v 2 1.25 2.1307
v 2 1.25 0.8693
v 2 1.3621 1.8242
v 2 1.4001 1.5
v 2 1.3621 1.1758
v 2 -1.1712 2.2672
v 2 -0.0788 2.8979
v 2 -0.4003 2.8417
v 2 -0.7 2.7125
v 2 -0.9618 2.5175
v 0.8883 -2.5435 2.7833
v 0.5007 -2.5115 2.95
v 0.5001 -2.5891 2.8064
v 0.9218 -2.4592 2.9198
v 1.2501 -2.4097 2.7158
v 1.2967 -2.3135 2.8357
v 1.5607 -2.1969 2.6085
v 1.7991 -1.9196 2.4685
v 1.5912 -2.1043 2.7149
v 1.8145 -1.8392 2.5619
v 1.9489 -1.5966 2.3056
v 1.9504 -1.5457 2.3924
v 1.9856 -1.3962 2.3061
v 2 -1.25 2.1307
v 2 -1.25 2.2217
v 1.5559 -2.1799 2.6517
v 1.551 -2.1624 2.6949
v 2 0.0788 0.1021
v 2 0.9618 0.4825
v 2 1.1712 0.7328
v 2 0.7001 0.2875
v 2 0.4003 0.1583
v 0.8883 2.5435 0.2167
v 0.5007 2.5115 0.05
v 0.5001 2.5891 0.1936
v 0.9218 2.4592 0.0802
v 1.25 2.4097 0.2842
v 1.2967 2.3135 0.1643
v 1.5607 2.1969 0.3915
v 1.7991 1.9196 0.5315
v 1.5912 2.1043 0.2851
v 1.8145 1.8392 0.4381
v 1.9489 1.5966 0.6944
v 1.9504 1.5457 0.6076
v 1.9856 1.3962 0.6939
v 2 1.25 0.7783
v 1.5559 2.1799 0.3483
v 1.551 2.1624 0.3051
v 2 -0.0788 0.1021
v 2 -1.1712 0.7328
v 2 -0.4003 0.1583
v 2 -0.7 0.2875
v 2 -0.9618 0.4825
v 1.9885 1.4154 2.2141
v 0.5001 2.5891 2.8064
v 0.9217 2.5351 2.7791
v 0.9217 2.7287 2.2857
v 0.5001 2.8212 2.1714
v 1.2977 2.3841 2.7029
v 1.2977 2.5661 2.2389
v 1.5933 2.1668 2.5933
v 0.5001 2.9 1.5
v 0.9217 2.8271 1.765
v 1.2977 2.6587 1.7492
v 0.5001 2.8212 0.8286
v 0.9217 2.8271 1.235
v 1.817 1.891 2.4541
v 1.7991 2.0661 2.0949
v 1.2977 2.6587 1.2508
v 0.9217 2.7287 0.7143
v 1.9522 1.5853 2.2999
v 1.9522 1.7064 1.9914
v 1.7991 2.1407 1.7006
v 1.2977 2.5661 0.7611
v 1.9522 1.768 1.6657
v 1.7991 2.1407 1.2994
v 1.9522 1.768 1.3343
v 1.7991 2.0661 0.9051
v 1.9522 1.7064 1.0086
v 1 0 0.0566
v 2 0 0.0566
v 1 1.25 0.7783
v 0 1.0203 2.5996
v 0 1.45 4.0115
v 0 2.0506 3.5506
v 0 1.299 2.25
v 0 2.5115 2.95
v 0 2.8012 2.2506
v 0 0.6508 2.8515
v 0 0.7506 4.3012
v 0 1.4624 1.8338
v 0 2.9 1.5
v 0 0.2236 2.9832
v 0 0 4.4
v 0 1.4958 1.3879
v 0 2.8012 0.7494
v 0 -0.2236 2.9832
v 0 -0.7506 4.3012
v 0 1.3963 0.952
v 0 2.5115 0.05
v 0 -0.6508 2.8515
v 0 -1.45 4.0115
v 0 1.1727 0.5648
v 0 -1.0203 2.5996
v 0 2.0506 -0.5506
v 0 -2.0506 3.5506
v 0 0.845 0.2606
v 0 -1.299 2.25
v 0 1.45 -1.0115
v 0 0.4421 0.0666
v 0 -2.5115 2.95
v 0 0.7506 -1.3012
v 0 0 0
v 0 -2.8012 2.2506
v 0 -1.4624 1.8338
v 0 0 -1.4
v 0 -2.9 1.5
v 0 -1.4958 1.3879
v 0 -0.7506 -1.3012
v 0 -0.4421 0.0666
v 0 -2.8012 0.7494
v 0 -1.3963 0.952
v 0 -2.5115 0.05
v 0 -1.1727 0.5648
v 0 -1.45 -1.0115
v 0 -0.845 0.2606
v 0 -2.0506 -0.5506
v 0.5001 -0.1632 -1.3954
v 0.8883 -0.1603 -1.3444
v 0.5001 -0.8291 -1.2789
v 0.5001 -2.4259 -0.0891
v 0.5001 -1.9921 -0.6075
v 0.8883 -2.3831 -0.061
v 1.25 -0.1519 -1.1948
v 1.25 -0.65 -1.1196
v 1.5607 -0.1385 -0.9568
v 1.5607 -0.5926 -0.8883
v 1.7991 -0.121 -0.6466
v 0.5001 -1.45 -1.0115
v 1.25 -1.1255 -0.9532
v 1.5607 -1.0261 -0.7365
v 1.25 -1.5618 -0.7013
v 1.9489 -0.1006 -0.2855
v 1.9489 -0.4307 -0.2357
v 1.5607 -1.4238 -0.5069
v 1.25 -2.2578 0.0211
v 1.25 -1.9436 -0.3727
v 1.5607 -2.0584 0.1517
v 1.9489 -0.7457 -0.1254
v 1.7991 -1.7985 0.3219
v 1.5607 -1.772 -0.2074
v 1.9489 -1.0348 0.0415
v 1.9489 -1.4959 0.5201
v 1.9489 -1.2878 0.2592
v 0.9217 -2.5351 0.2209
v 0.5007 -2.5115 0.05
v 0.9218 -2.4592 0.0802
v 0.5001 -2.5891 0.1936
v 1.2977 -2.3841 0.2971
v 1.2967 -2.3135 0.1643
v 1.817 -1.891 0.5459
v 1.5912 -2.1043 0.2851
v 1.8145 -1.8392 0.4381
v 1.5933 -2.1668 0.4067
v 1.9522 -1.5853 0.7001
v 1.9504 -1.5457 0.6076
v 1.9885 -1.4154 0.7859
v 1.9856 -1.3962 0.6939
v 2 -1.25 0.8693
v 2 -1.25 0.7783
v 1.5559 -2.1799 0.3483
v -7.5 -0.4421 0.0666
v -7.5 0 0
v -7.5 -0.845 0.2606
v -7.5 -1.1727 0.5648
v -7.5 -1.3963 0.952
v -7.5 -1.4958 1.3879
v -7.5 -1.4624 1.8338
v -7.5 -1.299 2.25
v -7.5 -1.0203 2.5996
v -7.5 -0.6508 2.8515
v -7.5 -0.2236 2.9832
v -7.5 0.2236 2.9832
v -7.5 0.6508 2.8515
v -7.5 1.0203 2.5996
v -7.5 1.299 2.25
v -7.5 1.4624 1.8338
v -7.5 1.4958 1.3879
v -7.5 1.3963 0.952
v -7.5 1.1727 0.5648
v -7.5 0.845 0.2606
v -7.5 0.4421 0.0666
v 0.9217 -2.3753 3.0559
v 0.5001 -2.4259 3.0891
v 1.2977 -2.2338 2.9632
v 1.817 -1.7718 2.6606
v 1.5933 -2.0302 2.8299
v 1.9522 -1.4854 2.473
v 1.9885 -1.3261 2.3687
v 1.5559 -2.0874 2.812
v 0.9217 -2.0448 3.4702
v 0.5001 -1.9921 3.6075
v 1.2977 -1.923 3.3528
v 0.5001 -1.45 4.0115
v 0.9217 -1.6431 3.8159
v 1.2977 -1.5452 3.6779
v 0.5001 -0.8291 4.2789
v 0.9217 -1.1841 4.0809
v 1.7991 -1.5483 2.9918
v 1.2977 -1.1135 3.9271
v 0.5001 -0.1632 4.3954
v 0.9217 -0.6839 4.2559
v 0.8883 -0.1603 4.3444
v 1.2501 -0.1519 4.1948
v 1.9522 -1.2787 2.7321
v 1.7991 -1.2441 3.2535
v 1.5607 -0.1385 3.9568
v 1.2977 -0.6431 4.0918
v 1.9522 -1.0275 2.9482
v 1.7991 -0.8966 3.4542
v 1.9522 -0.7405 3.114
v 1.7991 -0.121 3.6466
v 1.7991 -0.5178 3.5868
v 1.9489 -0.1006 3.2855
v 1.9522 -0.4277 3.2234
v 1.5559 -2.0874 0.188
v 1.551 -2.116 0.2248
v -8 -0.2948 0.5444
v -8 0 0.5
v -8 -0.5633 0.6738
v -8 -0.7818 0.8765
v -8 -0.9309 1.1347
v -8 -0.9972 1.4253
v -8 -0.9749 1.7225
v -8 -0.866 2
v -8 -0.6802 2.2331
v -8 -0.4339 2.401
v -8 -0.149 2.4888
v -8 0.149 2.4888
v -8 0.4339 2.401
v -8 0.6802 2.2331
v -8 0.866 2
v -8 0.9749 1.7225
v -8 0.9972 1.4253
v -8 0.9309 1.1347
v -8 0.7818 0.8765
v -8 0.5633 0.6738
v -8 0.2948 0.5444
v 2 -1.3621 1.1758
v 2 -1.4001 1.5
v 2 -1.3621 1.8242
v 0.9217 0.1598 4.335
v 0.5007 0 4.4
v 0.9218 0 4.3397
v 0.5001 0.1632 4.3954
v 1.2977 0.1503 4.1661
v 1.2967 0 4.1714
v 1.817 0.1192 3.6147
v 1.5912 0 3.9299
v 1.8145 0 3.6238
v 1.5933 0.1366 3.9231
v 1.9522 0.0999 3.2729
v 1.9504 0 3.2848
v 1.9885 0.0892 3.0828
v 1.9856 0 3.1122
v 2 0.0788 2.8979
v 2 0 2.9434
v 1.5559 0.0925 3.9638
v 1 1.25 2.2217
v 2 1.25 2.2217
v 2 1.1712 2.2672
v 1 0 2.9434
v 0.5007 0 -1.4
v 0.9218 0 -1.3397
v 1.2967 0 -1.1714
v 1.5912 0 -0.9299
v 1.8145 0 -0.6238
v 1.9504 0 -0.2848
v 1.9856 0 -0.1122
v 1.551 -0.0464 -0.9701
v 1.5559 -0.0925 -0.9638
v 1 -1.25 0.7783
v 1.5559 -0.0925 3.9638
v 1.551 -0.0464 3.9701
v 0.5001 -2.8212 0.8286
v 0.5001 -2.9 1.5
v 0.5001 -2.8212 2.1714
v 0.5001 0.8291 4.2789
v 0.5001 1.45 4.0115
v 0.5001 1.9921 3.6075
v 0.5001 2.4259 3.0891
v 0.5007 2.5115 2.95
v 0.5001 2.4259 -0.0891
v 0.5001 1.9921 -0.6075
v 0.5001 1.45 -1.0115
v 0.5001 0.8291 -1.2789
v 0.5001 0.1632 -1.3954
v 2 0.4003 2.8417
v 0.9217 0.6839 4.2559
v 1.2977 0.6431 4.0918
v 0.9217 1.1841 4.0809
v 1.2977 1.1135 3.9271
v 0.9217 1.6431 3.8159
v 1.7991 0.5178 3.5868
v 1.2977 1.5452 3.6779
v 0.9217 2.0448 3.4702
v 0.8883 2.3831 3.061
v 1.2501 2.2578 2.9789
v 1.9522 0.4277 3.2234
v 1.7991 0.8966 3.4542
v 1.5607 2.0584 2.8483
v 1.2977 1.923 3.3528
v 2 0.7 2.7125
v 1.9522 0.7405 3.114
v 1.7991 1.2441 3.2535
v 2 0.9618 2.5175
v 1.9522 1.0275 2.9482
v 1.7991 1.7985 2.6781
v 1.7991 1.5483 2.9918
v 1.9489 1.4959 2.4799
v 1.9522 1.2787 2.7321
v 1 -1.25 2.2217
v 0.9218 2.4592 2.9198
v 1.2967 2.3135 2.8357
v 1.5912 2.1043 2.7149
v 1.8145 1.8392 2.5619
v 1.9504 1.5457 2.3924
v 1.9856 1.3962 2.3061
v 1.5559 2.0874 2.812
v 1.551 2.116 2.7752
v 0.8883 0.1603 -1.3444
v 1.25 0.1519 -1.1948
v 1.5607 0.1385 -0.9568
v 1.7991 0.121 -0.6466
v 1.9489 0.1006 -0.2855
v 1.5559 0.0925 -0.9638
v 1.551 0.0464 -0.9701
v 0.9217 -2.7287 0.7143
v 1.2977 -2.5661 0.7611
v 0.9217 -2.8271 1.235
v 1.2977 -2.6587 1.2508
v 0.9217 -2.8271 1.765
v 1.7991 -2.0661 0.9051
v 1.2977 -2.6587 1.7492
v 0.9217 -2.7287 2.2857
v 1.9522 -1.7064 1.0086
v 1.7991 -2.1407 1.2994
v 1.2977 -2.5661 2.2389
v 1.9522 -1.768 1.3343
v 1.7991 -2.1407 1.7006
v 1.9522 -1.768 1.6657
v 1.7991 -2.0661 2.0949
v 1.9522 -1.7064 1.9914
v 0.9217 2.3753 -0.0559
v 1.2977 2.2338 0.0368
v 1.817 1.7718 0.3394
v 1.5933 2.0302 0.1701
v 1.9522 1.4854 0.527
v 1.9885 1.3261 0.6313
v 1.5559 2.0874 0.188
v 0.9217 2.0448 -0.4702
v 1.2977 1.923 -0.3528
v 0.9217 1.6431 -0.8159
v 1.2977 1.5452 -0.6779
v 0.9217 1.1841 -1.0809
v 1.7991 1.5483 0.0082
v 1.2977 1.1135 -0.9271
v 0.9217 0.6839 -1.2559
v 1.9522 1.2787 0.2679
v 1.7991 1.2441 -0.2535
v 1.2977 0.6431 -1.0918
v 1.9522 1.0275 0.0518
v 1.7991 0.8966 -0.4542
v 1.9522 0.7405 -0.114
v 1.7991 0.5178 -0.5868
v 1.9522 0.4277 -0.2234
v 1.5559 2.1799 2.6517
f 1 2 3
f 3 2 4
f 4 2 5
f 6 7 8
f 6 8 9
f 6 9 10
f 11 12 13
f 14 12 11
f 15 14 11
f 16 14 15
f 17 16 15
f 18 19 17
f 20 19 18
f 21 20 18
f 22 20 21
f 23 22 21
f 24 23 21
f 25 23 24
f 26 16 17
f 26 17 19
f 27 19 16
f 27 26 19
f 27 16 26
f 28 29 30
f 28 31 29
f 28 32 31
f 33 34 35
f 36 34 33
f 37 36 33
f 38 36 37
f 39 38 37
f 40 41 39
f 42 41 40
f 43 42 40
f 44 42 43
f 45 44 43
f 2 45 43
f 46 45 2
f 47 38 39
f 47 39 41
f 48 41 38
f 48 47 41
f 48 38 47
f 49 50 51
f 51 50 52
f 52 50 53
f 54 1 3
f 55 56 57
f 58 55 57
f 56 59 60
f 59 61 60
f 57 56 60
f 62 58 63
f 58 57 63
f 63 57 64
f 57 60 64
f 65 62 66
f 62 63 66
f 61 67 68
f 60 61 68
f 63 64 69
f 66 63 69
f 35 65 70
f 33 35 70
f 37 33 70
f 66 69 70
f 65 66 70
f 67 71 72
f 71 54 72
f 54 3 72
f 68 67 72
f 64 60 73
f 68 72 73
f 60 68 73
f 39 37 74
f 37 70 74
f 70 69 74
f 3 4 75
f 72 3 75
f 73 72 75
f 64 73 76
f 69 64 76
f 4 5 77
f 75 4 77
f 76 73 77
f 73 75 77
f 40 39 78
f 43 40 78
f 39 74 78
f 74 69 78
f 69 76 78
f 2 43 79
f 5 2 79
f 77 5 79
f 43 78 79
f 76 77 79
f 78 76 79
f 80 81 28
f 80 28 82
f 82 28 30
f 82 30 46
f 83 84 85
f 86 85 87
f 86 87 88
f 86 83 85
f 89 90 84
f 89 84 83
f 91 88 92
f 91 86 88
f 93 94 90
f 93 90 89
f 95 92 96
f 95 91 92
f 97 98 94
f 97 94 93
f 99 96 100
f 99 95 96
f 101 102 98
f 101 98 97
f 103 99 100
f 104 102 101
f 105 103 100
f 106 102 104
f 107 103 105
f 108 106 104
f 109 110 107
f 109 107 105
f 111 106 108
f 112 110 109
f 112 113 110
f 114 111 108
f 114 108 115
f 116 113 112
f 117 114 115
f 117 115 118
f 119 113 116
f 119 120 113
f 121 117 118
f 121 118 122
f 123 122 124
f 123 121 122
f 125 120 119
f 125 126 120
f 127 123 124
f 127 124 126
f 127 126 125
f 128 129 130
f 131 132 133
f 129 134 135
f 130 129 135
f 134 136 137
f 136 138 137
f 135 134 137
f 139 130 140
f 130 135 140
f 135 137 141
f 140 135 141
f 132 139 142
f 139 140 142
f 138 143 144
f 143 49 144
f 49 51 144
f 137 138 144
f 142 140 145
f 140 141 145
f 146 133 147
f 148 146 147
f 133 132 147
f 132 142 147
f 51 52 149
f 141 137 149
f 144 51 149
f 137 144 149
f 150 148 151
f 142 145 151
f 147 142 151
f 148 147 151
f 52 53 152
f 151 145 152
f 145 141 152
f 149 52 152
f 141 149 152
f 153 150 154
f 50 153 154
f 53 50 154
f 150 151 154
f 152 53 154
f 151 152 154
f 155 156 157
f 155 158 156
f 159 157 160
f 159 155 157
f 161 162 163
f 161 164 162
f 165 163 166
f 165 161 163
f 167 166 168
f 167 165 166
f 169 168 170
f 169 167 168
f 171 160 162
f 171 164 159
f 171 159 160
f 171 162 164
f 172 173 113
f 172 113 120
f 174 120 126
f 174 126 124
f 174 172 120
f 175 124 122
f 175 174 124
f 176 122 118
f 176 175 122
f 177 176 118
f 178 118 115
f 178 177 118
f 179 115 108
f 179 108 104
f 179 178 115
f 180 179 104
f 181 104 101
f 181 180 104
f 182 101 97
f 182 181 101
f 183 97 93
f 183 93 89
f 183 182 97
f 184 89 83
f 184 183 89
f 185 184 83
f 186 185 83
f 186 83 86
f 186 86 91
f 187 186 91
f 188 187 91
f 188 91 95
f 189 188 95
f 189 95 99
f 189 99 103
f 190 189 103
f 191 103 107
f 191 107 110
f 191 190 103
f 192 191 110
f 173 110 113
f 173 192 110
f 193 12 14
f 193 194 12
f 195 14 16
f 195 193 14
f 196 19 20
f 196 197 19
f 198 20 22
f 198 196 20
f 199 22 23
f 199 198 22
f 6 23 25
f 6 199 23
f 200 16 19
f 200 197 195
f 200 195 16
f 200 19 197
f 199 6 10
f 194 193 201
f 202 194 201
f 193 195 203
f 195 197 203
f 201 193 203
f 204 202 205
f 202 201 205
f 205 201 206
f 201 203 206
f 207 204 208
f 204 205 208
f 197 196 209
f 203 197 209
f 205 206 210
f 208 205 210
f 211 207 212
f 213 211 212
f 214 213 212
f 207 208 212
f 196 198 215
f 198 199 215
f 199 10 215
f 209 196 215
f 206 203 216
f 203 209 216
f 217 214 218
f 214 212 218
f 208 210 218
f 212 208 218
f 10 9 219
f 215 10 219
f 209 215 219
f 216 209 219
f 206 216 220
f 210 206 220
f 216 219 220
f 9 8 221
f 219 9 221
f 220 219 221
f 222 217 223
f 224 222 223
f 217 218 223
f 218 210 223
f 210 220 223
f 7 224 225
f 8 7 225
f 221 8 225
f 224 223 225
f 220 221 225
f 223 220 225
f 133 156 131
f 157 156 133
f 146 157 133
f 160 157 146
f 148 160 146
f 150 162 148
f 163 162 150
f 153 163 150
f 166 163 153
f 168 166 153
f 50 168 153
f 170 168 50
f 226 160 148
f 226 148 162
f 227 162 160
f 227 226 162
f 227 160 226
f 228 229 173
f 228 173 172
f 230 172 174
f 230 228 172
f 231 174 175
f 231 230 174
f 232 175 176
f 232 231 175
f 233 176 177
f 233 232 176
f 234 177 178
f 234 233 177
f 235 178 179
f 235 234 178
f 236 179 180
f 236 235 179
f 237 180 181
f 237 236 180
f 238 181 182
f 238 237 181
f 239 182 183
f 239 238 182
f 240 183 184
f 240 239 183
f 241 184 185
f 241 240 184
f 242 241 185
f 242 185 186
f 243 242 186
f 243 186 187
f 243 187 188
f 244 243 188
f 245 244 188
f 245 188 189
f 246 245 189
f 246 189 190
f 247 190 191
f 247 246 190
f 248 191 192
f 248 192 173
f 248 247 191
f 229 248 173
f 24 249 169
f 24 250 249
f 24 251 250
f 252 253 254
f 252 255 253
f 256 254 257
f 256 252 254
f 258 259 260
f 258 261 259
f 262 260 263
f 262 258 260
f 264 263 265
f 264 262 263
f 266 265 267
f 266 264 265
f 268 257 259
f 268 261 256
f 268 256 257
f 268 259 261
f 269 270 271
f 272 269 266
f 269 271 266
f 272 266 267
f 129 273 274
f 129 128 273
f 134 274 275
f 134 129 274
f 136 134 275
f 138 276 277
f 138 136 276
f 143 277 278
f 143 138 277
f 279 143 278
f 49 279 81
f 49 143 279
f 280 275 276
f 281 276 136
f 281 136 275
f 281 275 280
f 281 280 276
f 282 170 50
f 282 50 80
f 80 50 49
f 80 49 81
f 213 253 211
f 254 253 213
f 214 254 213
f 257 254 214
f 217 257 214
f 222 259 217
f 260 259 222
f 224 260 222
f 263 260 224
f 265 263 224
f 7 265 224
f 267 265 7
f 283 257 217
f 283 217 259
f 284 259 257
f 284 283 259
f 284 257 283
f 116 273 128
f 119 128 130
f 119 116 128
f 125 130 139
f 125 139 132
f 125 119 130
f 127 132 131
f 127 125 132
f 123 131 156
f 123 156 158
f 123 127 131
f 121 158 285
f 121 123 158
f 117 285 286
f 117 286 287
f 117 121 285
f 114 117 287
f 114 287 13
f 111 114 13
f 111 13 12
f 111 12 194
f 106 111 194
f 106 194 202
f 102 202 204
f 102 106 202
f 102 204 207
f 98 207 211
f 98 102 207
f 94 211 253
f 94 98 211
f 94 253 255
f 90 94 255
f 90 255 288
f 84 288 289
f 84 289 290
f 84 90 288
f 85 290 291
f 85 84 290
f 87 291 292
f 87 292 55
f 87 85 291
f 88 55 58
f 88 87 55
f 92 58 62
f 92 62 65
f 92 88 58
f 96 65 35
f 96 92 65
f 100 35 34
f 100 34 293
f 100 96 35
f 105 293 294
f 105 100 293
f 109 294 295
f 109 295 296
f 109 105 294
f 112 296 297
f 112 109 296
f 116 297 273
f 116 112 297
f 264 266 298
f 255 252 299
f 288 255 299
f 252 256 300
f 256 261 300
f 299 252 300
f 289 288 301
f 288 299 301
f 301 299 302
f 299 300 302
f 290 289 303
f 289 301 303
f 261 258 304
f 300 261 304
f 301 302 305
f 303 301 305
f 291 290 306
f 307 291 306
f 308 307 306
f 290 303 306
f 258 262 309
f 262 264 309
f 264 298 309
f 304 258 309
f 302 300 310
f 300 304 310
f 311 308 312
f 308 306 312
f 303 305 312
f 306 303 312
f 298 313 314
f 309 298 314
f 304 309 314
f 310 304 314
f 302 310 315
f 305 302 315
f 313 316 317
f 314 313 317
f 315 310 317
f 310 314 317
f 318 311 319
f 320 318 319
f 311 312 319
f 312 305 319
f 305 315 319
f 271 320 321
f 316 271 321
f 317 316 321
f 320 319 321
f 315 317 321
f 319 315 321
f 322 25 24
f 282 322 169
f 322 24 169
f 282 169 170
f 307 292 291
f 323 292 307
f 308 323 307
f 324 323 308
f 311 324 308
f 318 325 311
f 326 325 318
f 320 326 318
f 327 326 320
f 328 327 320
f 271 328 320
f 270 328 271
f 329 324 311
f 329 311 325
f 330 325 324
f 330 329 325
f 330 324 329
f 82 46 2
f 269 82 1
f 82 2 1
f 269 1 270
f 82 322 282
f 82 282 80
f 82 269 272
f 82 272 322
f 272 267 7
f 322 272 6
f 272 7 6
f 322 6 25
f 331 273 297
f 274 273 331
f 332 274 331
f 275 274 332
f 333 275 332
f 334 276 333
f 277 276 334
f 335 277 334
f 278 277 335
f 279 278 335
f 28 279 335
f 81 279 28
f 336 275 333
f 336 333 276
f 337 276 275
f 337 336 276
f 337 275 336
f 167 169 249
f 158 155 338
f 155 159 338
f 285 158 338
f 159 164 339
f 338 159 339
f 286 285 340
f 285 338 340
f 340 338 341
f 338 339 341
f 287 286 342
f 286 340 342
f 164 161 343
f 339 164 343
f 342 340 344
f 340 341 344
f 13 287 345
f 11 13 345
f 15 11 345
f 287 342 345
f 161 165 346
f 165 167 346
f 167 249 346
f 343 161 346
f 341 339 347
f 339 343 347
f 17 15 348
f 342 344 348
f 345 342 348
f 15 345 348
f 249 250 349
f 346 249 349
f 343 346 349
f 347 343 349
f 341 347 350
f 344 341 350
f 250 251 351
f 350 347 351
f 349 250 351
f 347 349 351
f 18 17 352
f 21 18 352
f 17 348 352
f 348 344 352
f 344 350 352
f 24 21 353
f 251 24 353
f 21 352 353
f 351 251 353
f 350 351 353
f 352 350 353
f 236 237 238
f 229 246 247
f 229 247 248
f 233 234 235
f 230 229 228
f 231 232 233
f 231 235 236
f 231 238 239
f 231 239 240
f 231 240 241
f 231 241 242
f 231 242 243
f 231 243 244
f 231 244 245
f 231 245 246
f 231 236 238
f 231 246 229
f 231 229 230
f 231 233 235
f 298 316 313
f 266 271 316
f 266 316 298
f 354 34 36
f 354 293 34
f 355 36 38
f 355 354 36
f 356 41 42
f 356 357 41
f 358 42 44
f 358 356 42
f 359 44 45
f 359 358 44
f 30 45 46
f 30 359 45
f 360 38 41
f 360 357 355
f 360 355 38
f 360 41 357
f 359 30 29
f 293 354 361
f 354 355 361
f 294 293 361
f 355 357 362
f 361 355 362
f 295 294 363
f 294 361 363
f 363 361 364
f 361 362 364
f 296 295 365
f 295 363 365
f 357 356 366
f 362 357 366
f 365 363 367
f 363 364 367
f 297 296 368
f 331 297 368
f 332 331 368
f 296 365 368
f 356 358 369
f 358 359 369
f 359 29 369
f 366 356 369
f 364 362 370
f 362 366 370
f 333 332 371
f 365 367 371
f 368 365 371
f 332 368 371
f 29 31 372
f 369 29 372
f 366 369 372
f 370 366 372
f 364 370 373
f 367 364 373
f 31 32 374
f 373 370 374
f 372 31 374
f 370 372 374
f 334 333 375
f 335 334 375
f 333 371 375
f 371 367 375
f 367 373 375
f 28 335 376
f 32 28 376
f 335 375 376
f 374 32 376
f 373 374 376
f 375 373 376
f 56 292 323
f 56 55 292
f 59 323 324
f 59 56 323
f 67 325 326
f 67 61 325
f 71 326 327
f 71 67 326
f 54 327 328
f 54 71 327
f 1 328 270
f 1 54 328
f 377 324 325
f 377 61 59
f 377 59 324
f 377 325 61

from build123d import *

# Parameters (mm, degrees)
CUT_EXTRUDE1_DEPTH = 1
FILLET1_R          = 1.5
CHAMFER1_SIZE      = 0.5


with BuildPart() as part:
    # Sketch1 → Revolve1 (revolve)
    with BuildSketch(Plane(origin=(0, 0, 0), x_dir=(1, 0, 0), z_dir=(0, 1, 0))):
        Polygon((0, 0), (-8, -9.8e-16), (-8, -1.500000000000001), (1e-17, -1.5), align=None)
        Polygon((1e-17, 1.3999999999999995), (1e-17, 0), (1e-17, -1.5), (2, -1.5), (2, 1.3999999999999995), align=None)
    revolve(axis=Axis((1e-17, 0, 1.5), (-1, 0, 1.4e-16)))

    # Sketch3 → Cut-Extrude1 (cut)
    with BuildSketch(Plane(origin=(2, 0, -2.7e-16), x_dir=(-1.3e-16, 0, -1), z_dir=(1, 0, -1.3e-16))):
        Polygon((-2.2216878364870323, -1.2500000000000002), (-0.7783121635129678, -1.2500000000000002), (-0.05662432702593554, 0), (-0.7783121635129678, 1.2500000000000002), (-2.2216878364870323, 1.2500000000000004), (-2.9433756729740645, 0), align=None)
    extrude(amount=-CUT_EXTRUDE1_DEPTH, mode=Mode.SUBTRACT)

    # Fillet1
    fillet1_edges = [part.edges().sort_by_distance(p)[0] for p in [
        (2.000000000000001, -3.6e-16, 4.3999999999999995),
    ]]
    fillet(fillet1_edges, radius=FILLET1_R - 0.0001)  # a hair under: the kernel refuses the full size

    # Chamfer1
    chamfer1_edges = [part.edges().sort_by_distance(p)[0] for p in [
        (-8, -1.8e-16, 3.0000000000000013),
    ]]
    chamfer(chamfer1_edges, length=CHAMFER1_SIZE)


solid = part.part
